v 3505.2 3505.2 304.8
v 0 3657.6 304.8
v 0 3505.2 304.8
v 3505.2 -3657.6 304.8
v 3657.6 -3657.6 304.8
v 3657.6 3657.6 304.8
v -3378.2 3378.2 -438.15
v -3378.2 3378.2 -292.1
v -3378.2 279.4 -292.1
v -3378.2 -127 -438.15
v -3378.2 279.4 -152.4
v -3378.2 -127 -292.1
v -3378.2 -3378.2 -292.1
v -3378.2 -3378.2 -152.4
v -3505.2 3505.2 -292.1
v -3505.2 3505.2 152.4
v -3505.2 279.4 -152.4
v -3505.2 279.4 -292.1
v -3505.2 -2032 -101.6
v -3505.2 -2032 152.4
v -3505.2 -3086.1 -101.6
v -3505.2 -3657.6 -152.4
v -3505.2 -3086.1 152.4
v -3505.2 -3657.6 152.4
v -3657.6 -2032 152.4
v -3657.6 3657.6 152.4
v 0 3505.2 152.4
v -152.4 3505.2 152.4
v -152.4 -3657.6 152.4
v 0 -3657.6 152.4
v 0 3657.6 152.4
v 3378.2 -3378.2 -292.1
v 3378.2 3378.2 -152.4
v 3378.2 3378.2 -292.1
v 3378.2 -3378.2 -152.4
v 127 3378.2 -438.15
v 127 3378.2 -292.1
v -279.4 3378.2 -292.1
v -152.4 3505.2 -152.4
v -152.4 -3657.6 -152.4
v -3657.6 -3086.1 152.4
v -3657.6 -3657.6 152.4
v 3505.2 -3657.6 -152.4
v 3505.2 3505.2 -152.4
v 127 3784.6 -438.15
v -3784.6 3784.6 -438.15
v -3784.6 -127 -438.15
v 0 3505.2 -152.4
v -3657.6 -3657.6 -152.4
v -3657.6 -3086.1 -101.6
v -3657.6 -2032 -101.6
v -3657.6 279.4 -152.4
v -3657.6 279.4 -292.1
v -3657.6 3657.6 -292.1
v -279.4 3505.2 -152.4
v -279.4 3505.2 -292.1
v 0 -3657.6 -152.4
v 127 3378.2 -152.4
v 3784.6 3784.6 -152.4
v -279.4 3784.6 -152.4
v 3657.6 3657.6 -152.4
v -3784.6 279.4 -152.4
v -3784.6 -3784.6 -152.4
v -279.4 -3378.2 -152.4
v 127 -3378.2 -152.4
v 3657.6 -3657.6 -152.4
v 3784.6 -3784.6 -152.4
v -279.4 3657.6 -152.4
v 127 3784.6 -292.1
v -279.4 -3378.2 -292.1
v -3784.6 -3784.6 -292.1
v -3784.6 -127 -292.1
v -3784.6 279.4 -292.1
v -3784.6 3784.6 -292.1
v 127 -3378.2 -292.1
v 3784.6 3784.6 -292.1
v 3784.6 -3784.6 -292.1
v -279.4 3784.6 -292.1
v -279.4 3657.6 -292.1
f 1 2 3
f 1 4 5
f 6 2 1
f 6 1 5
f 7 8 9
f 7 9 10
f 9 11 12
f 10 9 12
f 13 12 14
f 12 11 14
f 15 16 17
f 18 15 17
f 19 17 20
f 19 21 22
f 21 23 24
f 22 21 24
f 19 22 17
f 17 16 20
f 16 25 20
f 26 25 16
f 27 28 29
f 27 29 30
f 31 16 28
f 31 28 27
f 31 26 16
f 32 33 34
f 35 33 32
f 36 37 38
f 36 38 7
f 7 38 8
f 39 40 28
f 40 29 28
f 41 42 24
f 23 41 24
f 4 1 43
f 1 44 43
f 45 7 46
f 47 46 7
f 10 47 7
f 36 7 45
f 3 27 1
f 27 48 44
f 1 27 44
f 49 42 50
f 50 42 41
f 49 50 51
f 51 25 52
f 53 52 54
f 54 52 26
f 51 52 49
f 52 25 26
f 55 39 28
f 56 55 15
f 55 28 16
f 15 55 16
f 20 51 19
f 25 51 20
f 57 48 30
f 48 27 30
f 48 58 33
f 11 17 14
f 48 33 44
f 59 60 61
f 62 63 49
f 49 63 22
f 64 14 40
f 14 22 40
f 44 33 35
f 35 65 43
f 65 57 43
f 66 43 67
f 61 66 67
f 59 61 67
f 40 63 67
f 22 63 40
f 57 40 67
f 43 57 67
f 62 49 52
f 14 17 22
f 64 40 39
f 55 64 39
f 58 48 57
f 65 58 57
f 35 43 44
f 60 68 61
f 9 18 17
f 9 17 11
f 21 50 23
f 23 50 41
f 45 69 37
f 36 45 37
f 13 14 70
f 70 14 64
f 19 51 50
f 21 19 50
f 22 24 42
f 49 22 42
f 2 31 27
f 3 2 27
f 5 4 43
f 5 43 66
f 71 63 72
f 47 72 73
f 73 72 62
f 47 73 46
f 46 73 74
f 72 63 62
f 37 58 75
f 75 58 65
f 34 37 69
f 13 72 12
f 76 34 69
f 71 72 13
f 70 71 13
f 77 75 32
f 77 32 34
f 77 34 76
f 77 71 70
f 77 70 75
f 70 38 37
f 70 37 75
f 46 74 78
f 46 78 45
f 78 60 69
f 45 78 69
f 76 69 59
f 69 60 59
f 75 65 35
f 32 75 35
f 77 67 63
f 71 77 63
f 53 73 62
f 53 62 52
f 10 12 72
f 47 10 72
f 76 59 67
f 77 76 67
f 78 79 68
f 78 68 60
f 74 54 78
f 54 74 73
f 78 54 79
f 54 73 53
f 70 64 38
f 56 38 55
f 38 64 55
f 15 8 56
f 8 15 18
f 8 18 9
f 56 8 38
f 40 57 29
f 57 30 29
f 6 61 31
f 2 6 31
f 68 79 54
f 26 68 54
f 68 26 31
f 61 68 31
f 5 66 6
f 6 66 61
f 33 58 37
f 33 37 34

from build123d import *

# Parameters (mm, degrees)
F1_DEPTH  = 152.4
F2_DEPTH  = 152.4
F3_W      = 3251.2
F3_H      = 6756.4
F4_DEPTH  = 139.7
F7_DEPTH  = 146.05
F8_DEPTH  = 152.4
F12_W     = 1054.1
F12_H     = 254
F13_DEPTH = 284.48


with BuildPart() as f1:
    # F0 (on Top) → F1 (new body)
    with BuildSketch(Plane.XY):
        Polygon((3657.6, 3657.6), (-3657.6, 3657.6), (-3657.6, -3657.6), (-3505.2, -3657.6), (-3505.2, 3505.2), (-152.4, 3505.2), (-152.4, -3657.6), (0, -3657.6), (0, 3505.2), (3505.2, 3505.2), (3505.2, -3657.6), (3657.6, -3657.6), align=None)
    extrude(amount=F1_DEPTH)

    # F1_face (on face) → F2 (join)
    with BuildSketch(Plane(origin=(-18.949206, 852.714286, 0), x_dir=(1, 0, 0), z_dir=(0, 0, -1))):
        Polygon((-3638.650794, -2804.885714), (3676.549206, -2804.885714), (3676.549206, 4510.314286), (3524.149206, 4510.314286), (3524.149206, -2652.485714), (18.949206, -2652.485714), (18.949206, 4510.314286), (-133.450794, 4510.314286), (-133.450794, -2652.485714), (-3486.250794, -2652.485714), (-3486.250794, 4510.314286), (-3638.650794, 4510.314286), align=None)
    extrude(amount=F2_DEPTH)

    # F3 (on face) → F4 (join)
    with BuildSketch(Plane(origin=(0, 0, -152.4), x_dir=(1, 0, 0), z_dir=(0, 0, -1))):
        Polygon((3784.6, 3784.6), (-3784.6, 3784.6), (-3784.6, -279.4), (-3657.6, -279.4), (-3657.6, -3657.6), (-279.4, -3657.6), (-279.4, -3784.6), (3784.6, -3784.6), align=None)
        Polygon((-3378.2, -279.4), (-3378.2, 3378.2), (-279.4, 3378.2), (-279.4, -3505.2), (-3505.2, -3505.2), (-3505.2, -279.4), align=None, mode=Mode.SUBTRACT)
        with Locations((1752.6, 0)):
            Rectangle(F3_W, F3_H, mode=Mode.SUBTRACT)
    extrude(amount=F4_DEPTH)

    # F6 (on face) → F7 (join)
    with BuildSketch(Plane(origin=(0, 0, -292.1), x_dir=(1, 0, 0), z_dir=(0, 0, -1))):
        Polygon((-3378.2, 127), (-3784.6, 127), (-3784.6, -3784.6), (127, -3784.6), (127, -3378.2), (-3378.2, -3378.2), align=None)
    extrude(amount=F7_DEPTH)

    # F5 (on face) → F8 (join)
    with BuildSketch(Plane.XY.offset(152.4)):
        Polygon((3657.6, 3657.6), (0, 3657.6), (0, 3505.2), (3505.2, 3505.2), (3505.2, -3657.6), (3657.6, -3657.6), align=None)
    extrude(amount=F8_DEPTH)

    # F12 (on face) → F13 (cut)
    with BuildSketch(Plane(origin=(-3657.6, 0, 0), x_dir=(0, -1, 0), z_dir=(-1, 0, 0))):
        with Locations((2559.05, 25.4)):
            Rectangle(F12_W, F12_H)
    extrude(amount=-F13_DEPTH, mode=Mode.SUBTRACT)


solid = f1.part
